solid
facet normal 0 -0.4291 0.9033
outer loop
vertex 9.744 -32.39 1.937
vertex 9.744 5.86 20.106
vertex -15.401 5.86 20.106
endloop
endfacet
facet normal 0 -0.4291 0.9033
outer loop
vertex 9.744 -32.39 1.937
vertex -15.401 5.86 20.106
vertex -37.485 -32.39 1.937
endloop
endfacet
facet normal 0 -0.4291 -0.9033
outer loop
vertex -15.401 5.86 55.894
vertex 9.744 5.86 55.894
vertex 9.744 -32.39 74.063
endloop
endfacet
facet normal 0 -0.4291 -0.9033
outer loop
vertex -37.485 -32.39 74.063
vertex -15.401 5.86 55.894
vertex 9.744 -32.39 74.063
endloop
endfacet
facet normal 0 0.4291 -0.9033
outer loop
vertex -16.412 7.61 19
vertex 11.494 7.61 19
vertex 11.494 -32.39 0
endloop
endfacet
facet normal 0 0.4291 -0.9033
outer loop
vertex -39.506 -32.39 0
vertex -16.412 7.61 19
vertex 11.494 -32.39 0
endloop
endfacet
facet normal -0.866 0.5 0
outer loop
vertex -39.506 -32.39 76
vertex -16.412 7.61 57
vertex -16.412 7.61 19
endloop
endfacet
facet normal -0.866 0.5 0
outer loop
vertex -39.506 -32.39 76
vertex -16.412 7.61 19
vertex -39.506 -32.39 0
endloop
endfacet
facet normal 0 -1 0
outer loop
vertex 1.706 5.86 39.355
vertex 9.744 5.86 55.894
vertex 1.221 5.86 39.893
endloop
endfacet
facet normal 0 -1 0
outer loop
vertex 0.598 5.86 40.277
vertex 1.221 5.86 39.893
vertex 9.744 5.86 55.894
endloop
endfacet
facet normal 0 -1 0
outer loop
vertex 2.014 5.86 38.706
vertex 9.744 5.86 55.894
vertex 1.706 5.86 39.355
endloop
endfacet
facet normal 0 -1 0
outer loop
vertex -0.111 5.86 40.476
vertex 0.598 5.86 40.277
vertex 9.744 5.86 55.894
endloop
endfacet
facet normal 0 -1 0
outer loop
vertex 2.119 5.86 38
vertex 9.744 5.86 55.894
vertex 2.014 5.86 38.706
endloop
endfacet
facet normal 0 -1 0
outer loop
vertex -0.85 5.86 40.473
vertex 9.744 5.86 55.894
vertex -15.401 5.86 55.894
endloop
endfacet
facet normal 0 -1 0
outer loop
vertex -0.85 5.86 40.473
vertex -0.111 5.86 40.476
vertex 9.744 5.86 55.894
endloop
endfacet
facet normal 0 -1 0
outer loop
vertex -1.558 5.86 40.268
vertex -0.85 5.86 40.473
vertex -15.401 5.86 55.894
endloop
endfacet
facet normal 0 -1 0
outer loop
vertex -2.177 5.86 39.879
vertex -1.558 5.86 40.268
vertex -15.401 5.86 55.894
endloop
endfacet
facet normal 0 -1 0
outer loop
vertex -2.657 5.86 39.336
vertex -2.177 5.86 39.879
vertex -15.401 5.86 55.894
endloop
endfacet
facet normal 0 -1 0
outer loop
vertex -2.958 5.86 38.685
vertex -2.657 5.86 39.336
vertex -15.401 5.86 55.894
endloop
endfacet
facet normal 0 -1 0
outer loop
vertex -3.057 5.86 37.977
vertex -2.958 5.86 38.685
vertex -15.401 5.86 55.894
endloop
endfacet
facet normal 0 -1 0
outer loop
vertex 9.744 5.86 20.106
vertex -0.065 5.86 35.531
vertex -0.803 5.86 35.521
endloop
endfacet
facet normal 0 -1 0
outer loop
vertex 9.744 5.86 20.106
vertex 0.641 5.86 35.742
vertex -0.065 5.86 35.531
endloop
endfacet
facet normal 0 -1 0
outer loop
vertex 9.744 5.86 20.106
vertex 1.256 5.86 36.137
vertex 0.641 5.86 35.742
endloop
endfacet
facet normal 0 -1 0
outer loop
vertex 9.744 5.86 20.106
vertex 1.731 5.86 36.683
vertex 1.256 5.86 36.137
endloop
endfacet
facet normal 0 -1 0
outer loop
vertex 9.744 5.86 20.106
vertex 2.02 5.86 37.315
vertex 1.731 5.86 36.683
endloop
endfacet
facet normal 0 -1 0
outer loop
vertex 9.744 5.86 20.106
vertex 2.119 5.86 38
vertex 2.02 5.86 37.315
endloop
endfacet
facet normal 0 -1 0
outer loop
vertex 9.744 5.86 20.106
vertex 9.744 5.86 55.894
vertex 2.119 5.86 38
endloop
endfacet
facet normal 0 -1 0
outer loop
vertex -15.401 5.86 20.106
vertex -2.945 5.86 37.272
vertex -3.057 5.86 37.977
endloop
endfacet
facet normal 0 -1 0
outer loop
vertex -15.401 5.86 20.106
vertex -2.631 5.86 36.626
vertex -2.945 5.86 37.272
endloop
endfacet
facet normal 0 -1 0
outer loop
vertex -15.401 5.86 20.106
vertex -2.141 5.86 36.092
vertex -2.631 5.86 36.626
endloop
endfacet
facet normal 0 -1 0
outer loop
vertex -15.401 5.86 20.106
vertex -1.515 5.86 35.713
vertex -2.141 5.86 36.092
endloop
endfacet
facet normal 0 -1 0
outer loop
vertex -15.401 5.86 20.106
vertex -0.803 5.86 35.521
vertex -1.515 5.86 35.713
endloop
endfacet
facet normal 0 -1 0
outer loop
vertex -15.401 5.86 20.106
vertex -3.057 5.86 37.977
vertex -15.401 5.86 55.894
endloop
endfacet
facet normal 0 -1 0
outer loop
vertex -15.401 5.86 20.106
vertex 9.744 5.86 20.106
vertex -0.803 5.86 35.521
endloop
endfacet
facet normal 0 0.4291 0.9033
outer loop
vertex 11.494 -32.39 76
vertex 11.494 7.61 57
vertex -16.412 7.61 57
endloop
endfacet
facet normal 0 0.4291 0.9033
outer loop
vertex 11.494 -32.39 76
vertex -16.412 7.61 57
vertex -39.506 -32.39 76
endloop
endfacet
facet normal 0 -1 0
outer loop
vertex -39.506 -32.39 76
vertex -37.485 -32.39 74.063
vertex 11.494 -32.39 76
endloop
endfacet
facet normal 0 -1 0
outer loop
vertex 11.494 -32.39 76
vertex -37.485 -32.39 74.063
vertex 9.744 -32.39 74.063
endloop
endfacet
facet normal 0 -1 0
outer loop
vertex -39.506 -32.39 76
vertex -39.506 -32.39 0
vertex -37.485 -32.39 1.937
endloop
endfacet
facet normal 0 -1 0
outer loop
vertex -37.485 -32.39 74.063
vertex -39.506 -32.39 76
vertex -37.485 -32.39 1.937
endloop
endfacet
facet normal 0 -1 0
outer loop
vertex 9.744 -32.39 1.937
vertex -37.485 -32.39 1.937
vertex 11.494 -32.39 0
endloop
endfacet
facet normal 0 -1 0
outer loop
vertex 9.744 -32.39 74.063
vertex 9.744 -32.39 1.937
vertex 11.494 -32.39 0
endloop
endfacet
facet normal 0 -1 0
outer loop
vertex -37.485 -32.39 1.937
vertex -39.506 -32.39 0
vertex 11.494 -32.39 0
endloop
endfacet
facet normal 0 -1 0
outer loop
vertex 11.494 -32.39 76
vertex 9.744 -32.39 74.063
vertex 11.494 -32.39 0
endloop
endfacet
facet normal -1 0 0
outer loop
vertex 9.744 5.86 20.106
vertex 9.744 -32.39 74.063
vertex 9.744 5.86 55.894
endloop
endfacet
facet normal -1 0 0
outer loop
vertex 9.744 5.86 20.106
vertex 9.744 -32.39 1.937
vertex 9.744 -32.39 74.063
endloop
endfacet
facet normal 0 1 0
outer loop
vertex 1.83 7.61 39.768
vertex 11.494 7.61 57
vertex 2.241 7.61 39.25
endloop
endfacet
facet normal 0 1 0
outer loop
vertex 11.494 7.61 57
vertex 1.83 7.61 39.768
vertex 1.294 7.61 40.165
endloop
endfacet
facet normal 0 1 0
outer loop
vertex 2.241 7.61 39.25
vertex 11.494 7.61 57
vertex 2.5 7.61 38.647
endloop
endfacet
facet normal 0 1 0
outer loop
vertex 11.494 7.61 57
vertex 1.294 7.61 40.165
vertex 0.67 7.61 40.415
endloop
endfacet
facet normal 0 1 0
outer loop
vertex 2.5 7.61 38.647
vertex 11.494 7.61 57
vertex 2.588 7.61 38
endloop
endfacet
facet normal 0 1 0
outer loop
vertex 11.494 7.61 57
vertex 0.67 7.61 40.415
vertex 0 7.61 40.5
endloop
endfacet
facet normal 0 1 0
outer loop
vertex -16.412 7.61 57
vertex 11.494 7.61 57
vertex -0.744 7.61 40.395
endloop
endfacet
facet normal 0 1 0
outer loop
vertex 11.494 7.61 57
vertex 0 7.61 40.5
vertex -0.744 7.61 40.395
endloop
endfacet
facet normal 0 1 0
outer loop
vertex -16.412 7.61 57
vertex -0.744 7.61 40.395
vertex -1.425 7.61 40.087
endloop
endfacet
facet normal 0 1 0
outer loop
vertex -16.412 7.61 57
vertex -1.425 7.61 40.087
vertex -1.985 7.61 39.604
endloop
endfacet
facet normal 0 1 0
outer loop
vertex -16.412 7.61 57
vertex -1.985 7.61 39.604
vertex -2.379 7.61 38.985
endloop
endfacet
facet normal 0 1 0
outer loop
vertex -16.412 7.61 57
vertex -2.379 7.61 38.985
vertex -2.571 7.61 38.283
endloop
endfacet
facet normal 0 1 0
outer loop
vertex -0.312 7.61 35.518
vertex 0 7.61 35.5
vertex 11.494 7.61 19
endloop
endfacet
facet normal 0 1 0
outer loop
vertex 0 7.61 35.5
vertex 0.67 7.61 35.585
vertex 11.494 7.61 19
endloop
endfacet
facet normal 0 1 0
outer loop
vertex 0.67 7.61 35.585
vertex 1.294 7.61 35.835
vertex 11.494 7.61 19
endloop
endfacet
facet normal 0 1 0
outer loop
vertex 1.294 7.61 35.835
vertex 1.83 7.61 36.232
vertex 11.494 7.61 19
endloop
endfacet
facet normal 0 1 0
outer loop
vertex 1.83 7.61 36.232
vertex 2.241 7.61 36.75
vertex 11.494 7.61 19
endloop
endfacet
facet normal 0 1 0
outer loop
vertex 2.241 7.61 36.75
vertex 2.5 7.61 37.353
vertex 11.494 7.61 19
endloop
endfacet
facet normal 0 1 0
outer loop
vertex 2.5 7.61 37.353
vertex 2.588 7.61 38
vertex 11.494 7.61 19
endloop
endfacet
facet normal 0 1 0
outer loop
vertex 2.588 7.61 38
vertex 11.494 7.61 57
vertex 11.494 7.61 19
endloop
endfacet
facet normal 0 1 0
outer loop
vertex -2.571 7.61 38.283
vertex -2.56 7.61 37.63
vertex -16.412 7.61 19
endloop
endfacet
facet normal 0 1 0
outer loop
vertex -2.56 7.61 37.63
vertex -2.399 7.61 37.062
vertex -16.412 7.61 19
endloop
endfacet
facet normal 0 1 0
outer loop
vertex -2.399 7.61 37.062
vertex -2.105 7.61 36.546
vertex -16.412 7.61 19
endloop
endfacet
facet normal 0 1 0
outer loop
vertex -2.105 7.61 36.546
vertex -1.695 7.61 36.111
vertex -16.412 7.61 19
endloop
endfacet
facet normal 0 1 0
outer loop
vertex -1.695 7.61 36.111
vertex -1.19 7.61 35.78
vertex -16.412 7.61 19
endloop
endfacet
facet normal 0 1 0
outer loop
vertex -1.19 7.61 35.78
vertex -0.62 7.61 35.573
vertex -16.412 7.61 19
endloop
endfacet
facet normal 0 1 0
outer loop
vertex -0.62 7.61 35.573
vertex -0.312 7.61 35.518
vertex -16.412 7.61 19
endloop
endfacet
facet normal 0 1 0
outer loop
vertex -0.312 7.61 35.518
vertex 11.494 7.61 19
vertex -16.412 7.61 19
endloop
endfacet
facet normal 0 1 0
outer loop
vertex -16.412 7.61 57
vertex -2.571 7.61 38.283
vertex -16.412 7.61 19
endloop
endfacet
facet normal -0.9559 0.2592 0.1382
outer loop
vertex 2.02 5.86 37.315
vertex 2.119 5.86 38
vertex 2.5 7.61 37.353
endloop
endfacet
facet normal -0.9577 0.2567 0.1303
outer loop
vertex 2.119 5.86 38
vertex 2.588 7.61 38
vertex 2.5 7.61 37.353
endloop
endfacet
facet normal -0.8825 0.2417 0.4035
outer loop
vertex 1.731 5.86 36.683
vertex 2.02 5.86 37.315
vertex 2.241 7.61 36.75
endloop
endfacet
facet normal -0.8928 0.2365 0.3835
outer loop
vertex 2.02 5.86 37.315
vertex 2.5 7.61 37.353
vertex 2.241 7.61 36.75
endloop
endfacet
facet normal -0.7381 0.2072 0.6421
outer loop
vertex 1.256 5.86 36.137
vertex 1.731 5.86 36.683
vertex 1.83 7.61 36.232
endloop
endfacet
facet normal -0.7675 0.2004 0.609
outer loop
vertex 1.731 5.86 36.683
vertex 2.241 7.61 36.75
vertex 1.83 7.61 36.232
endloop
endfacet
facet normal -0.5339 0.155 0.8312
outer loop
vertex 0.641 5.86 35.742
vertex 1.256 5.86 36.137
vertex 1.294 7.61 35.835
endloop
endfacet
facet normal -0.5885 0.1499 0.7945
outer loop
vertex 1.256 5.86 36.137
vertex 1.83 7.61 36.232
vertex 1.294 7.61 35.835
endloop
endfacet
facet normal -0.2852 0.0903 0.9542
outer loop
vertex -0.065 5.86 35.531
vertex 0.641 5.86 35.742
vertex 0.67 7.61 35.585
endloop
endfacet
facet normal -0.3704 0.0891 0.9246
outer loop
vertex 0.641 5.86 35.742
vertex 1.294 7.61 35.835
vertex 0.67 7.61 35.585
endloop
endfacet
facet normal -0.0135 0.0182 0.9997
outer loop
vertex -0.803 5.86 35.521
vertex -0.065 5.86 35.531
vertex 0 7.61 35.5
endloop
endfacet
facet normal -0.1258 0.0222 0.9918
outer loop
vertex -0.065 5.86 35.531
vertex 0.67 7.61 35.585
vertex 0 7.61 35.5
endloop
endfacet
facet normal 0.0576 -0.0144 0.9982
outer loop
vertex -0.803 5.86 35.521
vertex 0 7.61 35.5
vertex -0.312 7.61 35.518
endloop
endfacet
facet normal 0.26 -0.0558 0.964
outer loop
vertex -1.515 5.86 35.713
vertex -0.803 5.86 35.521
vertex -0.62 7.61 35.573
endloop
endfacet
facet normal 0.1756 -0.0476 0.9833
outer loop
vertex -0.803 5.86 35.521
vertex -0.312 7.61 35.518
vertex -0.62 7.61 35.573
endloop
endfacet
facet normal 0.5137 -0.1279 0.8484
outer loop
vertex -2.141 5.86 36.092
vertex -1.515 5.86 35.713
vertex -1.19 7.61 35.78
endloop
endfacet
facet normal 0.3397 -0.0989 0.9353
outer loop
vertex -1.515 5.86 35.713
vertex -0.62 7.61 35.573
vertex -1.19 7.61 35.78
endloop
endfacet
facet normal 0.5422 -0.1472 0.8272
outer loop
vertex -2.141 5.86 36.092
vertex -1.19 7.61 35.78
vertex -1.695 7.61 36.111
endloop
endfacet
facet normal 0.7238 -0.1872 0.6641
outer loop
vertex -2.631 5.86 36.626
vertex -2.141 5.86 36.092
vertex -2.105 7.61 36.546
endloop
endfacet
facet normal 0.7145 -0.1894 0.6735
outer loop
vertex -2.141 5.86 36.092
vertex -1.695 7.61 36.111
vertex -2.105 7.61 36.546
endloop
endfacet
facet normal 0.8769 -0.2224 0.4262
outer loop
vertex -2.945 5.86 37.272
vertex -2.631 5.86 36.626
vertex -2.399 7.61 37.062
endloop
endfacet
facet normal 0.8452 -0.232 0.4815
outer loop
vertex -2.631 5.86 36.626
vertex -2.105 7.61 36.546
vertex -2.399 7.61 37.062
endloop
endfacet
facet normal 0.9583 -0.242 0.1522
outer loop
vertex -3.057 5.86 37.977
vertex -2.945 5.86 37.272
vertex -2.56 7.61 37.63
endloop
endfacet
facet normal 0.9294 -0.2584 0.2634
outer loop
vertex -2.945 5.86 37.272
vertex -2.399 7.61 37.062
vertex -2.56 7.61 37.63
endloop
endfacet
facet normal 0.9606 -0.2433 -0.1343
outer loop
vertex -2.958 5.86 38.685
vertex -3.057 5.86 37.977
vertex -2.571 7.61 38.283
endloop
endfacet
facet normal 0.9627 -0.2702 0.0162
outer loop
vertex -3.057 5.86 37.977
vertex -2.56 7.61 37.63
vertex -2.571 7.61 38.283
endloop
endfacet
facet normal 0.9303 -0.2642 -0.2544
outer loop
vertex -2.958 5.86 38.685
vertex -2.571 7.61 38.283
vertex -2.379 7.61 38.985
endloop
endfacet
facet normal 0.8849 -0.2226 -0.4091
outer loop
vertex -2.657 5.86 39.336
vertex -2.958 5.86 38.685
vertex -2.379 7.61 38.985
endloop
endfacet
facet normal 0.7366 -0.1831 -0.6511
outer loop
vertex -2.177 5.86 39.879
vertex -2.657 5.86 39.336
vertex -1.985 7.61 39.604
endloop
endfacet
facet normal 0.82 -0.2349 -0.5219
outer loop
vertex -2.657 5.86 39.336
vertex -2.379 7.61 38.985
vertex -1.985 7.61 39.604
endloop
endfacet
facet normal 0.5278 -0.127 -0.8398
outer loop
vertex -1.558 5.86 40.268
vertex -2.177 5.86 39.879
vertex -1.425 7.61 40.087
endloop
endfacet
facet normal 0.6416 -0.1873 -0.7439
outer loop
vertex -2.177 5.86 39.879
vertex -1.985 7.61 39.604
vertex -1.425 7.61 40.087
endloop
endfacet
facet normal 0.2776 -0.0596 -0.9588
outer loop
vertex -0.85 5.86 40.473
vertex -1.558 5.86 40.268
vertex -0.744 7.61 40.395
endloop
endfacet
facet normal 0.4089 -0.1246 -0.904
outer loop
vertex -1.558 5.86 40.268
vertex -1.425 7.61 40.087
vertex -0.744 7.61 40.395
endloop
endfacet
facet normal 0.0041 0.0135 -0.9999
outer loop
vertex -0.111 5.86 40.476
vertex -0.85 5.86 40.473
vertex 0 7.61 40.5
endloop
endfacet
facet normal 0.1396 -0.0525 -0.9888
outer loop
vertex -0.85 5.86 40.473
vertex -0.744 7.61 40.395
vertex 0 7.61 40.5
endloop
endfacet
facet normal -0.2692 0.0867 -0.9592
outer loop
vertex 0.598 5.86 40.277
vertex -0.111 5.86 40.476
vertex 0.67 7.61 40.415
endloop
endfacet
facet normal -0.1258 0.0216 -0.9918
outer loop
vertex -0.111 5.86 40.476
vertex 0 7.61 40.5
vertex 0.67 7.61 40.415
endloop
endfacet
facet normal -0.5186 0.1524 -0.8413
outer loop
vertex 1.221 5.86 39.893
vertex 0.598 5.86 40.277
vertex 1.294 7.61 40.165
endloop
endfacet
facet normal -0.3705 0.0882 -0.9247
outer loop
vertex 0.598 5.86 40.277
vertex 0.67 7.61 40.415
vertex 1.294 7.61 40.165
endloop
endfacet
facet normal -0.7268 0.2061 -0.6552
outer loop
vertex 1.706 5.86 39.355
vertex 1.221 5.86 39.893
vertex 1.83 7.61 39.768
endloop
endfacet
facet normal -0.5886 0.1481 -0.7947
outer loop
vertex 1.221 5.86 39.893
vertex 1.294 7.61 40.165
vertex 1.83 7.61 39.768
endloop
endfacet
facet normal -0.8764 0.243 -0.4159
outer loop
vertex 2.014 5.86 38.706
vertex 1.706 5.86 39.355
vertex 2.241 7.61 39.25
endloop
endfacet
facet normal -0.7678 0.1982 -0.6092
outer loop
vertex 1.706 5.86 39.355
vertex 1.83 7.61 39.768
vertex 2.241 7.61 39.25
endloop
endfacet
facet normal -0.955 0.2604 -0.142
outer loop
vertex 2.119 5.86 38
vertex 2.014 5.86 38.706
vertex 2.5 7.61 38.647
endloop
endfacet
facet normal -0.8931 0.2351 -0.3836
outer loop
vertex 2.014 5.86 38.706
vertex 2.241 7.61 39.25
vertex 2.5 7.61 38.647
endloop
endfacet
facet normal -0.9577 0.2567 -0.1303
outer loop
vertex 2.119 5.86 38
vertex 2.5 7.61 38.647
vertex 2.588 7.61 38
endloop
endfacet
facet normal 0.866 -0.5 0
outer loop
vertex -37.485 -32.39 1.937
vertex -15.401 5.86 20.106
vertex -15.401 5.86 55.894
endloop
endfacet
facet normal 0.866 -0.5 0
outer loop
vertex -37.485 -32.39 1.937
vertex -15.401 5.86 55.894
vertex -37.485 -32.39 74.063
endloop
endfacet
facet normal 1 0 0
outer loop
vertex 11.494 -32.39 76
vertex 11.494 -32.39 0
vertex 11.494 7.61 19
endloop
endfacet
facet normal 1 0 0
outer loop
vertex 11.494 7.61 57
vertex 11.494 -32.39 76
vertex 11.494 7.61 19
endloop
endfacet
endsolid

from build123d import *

# Parameters (mm, degrees)
EXTRUDE_1_DEPTH     = 76
CUT_EXTRUDE_1_DEPTH = 98.088188339
SHELL_2_T           = -1.75
SKETCH_7_R          = 2.5
CUT_EXTRUDE_3_DEPTH = 96.132124654
CUT_EXTRUDE_START   = 3
SKETCH_7_2_R        = 2.5
CUT_EXTRUDE_4_DEPTH = 3


with BuildPart() as part:
    # ｽｹｯﾁ1 → ﾎﾞｽ - 押し出し1 (new body)
    with BuildSketch(Plane.XY):
        Polygon((-16.411750997, 7.609934935), (-39.505761764, -32.390065065), (11.494238236, -32.390065065), (11.494238236, 7.609934935), align=None)
    extrude(amount=EXTRUDE_1_DEPTH)

    # ｽｹｯﾁ2 → ｶｯﾄ - 押し出し1 (cut, through all)
    with BuildSketch(Plane(origin=(11.494238236, 0, 0), x_dir=(0, 0, -1), z_dir=(1, 0, 0))):
        Polygon((-57, 7.609934935), (-76, -32.390065065), (-76, 7.609934935), align=None)
        Polygon((-19, 7.609934935), (0, -32.390065065), (0, 7.609934935), align=None)
    extrude(amount=-CUT_EXTRUDE_1_DEPTH, mode=Mode.SUBTRACT)

    # ｼｪﾙ2
    shell_2_openings = [part.faces().sort_by_distance(p)[0] for p in [
        (-14.005761764, -32.390065065, 38),
    ]]
    offset(amount=SHELL_2_T, openings=shell_2_openings, kind=Kind.INTERSECTION)

    # ｽｹｯﾁ7 → ｶｯﾄ - 押し出し3 (cut, through all)
    with BuildSketch(Plane(origin=(1.902483734, 7.100165955, 0), x_dir=(0.9659258262890676, -0.2588190451025229, 0), z_dir=(0.25881904510252296, 0.9659258262890678, 0))):
        with Locations((-1.969596093, -38)):
            Circle(SKETCH_7_R)
    extrude(amount=-CUT_EXTRUDE_3_DEPTH, mode=Mode.SUBTRACT)

    # ｽｹｯﾁ7<2> → ｶｯﾄ - 押し出し4 (cut)
    with BuildSketch(Plane(origin=(1.902483734, 7.100165955, 0), x_dir=(0.9659258262890676, -0.2588190451025229, 0), z_dir=(0.25881904510252296, 0.9659258262890678, 0)).offset(CUT_EXTRUDE_START)):
        with Locations((-1.969596093, -38)):
            Circle(SKETCH_7_2_R)
    extrude(amount=-CUT_EXTRUDE_4_DEPTH, mode=Mode.SUBTRACT)


solid = part.part
